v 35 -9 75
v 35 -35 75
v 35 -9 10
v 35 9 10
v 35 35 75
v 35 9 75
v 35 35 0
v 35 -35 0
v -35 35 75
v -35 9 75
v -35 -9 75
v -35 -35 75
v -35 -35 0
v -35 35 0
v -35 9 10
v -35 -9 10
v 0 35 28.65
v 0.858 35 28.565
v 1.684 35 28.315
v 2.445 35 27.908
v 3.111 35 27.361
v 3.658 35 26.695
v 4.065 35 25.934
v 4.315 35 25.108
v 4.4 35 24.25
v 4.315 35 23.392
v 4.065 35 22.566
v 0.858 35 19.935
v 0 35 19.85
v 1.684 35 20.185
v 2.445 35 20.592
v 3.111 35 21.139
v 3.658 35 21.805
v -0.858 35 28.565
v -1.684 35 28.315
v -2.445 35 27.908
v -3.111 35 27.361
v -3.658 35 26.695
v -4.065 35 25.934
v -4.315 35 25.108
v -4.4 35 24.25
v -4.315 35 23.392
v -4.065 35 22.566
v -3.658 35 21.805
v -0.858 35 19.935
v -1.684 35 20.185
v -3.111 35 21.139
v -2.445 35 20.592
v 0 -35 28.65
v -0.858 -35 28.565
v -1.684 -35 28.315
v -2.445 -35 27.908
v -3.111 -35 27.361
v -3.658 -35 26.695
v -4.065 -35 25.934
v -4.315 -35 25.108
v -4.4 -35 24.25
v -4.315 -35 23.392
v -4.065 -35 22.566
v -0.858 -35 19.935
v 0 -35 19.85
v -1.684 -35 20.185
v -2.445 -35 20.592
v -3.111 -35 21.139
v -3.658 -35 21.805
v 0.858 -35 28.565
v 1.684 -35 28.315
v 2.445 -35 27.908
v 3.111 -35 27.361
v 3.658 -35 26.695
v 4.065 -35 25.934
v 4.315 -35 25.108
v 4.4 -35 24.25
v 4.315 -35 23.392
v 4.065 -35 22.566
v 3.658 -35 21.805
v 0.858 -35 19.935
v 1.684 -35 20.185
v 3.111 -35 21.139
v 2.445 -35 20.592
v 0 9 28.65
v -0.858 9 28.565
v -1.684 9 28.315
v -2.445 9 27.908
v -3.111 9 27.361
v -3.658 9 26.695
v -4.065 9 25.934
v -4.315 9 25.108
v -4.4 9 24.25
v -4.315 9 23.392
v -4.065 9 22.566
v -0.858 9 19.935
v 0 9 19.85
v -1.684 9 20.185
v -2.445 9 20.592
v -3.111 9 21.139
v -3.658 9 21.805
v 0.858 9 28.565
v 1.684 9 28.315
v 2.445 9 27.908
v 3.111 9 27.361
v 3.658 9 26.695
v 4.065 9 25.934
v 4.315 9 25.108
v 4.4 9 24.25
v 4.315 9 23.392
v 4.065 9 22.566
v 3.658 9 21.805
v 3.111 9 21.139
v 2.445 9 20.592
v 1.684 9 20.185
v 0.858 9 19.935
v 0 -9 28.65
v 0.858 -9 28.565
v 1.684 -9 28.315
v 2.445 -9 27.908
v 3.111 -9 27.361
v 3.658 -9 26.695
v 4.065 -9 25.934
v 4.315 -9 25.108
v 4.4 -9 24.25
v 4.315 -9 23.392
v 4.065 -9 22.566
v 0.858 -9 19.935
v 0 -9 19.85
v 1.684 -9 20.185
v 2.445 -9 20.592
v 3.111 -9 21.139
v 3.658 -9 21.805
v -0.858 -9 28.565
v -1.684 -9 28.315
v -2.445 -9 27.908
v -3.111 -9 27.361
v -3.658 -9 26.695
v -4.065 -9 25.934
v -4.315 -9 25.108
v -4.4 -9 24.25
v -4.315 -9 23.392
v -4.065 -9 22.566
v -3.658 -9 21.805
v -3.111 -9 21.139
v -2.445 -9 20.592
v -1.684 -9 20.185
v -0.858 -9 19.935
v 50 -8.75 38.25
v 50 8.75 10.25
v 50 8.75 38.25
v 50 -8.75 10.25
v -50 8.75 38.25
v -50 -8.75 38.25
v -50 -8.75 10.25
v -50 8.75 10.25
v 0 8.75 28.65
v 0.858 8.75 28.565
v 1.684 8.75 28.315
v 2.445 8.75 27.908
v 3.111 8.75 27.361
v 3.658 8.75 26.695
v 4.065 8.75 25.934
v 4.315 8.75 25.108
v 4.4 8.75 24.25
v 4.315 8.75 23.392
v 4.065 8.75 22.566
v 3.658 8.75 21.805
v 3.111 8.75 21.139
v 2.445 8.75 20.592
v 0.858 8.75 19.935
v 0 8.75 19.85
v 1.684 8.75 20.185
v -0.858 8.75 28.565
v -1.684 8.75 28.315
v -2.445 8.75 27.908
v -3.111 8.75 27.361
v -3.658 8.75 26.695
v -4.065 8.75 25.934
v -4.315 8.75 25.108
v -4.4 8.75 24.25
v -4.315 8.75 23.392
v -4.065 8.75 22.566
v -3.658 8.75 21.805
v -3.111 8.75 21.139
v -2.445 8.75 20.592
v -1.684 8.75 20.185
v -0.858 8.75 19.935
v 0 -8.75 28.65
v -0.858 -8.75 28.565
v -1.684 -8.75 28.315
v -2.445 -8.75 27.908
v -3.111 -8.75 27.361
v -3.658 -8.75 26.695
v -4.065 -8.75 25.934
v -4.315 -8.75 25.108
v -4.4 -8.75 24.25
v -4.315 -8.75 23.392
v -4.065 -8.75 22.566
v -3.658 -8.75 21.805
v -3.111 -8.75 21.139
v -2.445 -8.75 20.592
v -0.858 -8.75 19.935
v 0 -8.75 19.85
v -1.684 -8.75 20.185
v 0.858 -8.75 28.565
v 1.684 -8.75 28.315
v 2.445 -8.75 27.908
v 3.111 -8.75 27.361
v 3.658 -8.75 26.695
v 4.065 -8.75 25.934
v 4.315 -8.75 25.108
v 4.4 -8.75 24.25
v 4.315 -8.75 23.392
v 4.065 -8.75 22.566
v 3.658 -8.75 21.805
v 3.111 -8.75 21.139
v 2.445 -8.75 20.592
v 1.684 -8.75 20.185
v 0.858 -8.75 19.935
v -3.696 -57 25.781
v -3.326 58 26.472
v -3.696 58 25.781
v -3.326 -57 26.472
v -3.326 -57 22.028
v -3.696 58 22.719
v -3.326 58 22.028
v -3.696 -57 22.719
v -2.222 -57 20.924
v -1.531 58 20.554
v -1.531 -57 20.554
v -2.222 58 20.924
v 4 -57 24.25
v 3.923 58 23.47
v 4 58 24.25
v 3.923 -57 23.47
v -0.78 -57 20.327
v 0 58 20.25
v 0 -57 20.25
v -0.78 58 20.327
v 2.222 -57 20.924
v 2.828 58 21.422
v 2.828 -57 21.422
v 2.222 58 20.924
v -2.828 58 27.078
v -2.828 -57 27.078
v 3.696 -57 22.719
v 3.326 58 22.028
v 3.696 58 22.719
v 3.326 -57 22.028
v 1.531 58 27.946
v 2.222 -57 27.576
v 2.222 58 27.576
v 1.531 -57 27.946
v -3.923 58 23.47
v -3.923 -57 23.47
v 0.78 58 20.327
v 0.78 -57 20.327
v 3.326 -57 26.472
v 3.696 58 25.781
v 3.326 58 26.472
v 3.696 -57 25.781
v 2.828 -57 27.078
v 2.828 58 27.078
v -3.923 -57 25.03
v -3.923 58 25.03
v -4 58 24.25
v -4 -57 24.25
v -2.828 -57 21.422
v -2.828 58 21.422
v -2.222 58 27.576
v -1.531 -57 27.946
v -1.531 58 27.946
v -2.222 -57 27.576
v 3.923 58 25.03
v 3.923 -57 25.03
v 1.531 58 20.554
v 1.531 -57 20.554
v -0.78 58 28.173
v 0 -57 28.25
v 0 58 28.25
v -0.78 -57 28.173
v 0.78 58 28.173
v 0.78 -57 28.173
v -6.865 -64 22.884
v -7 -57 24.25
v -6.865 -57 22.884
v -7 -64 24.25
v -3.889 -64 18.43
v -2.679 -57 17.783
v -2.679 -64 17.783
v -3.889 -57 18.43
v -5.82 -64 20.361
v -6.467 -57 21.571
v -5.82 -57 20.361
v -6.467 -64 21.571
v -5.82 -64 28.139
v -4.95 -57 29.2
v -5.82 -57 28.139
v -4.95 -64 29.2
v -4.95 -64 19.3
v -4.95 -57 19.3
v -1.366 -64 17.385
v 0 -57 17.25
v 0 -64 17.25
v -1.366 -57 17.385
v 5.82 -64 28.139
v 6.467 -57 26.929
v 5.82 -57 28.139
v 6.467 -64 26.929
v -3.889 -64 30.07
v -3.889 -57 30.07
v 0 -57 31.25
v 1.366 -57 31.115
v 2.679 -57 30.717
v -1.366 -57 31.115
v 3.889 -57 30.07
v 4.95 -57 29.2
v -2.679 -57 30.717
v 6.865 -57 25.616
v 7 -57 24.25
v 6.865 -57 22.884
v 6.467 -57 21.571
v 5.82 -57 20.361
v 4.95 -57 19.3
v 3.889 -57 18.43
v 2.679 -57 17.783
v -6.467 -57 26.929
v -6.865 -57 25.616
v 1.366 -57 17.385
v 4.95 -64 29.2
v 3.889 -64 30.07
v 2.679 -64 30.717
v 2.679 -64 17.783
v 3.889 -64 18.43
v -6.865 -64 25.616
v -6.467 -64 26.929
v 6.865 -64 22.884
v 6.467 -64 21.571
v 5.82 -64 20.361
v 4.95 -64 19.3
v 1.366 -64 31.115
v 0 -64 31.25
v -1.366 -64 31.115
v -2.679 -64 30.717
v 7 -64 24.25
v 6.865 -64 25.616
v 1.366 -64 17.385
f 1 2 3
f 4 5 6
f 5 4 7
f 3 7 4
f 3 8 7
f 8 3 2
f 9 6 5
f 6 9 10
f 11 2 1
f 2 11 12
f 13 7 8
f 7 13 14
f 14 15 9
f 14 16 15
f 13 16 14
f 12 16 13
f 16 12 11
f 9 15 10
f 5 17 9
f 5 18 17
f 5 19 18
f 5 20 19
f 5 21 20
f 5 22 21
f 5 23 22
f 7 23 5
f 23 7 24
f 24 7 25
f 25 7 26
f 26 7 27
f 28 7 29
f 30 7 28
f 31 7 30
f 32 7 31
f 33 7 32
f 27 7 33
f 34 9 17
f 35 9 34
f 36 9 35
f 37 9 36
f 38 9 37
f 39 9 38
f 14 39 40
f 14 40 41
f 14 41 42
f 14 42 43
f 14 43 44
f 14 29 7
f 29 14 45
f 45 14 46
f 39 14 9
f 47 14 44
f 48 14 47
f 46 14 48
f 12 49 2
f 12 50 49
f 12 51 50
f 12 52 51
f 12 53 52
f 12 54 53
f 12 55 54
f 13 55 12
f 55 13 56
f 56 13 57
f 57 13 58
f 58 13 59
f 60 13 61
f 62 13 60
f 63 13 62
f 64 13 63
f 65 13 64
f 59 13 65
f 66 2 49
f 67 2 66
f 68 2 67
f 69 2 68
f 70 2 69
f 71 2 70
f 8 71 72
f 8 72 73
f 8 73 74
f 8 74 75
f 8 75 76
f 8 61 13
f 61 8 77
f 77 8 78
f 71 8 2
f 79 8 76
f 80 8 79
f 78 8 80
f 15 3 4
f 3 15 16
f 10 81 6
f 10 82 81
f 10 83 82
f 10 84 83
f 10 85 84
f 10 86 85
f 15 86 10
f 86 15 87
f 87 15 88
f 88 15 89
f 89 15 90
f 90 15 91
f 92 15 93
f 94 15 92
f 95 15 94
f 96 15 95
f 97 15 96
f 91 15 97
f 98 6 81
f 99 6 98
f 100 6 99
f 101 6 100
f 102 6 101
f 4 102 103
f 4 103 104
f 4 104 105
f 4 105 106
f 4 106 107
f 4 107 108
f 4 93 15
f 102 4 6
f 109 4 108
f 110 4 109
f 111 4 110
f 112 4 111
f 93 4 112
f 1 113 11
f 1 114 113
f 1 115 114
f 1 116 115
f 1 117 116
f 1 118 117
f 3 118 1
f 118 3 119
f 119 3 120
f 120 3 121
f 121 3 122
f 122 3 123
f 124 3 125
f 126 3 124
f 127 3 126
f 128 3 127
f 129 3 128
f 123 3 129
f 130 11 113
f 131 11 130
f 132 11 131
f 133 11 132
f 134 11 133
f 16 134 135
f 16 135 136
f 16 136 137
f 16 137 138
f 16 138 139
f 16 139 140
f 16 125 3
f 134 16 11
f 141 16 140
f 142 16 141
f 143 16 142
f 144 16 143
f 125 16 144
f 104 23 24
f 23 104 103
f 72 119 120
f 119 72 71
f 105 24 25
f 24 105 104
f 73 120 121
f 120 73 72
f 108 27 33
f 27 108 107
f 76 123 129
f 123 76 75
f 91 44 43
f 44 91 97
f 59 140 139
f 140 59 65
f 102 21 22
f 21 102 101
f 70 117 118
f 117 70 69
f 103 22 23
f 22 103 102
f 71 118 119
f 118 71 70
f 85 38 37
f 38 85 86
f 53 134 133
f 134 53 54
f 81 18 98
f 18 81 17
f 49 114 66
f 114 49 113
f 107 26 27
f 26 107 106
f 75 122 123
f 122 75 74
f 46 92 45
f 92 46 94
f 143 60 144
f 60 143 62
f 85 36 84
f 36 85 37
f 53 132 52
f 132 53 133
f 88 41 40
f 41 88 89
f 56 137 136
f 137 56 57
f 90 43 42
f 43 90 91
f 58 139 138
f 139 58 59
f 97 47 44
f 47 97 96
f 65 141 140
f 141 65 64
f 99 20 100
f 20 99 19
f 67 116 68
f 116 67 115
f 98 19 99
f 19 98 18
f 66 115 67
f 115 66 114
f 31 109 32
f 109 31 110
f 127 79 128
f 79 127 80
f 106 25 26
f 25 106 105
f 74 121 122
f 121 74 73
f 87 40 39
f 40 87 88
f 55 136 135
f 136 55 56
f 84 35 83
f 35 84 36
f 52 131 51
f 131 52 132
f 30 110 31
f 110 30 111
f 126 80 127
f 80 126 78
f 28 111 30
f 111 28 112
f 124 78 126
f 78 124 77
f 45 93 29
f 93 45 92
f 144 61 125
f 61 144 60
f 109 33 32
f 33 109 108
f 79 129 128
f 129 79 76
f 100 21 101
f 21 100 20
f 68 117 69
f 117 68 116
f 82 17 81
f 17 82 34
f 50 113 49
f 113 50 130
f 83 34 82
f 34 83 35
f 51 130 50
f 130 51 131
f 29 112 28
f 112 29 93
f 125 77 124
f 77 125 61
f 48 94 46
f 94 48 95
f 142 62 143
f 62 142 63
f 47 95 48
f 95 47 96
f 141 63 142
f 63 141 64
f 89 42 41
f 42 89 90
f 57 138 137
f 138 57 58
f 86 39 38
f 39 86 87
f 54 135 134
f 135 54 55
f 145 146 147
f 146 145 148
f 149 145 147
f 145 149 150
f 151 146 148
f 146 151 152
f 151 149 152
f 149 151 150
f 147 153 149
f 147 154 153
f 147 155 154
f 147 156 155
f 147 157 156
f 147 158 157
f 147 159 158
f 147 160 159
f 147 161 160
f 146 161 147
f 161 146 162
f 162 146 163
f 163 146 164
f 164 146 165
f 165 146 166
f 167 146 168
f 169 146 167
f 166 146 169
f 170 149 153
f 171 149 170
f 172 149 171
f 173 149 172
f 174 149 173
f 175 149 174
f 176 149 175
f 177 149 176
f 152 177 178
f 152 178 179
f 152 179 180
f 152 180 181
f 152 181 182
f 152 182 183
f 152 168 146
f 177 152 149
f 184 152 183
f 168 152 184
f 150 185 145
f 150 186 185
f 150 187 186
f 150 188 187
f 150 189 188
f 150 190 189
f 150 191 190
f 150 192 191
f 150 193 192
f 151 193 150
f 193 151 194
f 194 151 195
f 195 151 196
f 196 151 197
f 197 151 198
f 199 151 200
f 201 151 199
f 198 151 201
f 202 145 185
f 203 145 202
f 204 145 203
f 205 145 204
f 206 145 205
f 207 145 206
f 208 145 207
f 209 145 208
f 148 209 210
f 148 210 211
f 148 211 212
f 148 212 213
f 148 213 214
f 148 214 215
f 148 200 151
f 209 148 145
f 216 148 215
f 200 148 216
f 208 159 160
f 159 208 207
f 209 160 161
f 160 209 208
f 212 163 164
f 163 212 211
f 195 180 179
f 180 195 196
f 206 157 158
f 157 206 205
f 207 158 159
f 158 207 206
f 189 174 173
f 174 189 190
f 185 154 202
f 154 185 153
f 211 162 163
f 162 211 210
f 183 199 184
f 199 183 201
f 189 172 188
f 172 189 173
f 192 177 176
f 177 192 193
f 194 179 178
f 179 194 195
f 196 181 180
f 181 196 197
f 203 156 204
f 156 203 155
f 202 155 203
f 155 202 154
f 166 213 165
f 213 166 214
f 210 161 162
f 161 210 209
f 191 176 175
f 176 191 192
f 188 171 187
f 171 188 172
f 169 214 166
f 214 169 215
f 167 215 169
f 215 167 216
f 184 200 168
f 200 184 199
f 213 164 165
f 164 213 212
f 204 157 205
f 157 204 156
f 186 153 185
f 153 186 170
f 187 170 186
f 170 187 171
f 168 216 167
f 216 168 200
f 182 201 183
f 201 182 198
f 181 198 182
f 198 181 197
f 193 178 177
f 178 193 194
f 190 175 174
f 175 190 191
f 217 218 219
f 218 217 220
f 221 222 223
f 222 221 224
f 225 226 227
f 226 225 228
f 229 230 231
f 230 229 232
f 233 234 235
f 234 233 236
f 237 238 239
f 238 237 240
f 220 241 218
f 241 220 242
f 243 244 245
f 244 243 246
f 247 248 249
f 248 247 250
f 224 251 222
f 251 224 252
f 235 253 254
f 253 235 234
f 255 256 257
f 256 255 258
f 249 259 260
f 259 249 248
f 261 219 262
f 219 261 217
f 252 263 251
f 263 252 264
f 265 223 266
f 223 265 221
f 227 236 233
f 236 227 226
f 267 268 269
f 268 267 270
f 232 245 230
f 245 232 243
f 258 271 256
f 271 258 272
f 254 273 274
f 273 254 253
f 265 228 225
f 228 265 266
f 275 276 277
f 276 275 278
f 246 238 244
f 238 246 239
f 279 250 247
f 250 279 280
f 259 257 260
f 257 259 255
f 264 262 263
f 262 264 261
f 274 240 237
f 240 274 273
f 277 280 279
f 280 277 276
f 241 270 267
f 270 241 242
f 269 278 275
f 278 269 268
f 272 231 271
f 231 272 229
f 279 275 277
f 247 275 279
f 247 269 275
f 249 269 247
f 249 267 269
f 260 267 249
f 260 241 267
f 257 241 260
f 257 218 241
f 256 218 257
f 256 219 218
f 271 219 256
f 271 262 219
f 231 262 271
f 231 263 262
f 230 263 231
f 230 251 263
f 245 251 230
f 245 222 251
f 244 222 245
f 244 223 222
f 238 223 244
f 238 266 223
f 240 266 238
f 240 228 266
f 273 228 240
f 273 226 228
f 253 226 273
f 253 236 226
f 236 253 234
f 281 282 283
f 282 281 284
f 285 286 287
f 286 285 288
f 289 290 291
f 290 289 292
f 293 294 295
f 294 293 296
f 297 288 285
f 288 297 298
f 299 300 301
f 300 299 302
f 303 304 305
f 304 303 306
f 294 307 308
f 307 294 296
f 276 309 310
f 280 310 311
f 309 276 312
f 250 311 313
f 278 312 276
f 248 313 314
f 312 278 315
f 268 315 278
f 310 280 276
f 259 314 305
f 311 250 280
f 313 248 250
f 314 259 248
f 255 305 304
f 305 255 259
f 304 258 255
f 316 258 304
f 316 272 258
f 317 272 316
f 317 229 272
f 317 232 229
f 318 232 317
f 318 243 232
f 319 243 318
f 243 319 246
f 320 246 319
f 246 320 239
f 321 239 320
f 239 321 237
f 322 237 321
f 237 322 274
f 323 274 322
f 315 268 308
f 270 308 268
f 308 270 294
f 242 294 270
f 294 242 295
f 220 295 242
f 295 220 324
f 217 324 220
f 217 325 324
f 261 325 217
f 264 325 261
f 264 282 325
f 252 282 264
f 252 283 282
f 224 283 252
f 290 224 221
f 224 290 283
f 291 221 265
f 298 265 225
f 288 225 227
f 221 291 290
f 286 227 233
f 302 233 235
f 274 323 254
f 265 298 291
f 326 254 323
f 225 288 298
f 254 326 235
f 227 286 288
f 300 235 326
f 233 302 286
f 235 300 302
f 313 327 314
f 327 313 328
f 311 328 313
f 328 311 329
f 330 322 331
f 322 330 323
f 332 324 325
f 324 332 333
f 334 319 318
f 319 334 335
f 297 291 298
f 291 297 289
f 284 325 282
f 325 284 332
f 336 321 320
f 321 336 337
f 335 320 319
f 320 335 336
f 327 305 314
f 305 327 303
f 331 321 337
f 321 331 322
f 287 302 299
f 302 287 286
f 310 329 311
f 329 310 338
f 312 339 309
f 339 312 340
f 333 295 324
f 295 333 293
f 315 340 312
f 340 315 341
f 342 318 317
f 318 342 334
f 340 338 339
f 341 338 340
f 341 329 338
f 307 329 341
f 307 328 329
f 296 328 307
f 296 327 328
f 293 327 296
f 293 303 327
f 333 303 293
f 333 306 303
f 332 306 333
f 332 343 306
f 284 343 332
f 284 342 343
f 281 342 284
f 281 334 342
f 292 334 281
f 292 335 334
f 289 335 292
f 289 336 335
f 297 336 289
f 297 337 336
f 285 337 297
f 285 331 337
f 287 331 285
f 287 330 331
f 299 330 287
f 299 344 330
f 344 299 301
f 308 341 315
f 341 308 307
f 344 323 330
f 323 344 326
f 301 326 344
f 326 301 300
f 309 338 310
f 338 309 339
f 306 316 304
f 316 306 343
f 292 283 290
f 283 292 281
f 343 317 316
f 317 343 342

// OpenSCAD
$fn = 32;

// ------------------------------------------------------------------------
// Clevis joint: 70 mm clevis, pin d8
// Every part is its own module, assembly() places them once.
// ------------------------------------------------------------------------

// --- part 1 ---
module clevis() {
  difference() {
    translate([-35, -35, 0]) cube([70, 70, 75]);
    translate([-36, -9, 10]) cube([72, 18, 66]);
    translate([0, 0, 24.25]) rotate([90, 0, 0]) cylinder(h = 72, d = 8.8, center = true);
  }
}

// --- part 2 ---
module eye() {
  difference() {
    translate([-50, -8.75, 0]) cube([100, 17.5, 28]);
    translate([0, 0, 14]) rotate([90, 0, 0]) cylinder(h = 19.5, d = 8.8, center = true);
  }
}

// --- part 3 ---
module pin() {
  rotate([0, 90, 0]) cylinder(h = 116, d = 8, center = true);
  translate([-64, 0, 0]) rotate([0, 90, 0]) cylinder(h = 7, d = 14);
}

// --- assembly ---
module assembly() {
  translate([0, 0, 0]) rotate([0, 0, 0]) clevis();
  translate([0, 0, 10.25]) rotate([0, 0, 0]) eye();
  translate([0, 0, 24.25]) rotate([0, 0, 90]) pin();
}

assembly();
